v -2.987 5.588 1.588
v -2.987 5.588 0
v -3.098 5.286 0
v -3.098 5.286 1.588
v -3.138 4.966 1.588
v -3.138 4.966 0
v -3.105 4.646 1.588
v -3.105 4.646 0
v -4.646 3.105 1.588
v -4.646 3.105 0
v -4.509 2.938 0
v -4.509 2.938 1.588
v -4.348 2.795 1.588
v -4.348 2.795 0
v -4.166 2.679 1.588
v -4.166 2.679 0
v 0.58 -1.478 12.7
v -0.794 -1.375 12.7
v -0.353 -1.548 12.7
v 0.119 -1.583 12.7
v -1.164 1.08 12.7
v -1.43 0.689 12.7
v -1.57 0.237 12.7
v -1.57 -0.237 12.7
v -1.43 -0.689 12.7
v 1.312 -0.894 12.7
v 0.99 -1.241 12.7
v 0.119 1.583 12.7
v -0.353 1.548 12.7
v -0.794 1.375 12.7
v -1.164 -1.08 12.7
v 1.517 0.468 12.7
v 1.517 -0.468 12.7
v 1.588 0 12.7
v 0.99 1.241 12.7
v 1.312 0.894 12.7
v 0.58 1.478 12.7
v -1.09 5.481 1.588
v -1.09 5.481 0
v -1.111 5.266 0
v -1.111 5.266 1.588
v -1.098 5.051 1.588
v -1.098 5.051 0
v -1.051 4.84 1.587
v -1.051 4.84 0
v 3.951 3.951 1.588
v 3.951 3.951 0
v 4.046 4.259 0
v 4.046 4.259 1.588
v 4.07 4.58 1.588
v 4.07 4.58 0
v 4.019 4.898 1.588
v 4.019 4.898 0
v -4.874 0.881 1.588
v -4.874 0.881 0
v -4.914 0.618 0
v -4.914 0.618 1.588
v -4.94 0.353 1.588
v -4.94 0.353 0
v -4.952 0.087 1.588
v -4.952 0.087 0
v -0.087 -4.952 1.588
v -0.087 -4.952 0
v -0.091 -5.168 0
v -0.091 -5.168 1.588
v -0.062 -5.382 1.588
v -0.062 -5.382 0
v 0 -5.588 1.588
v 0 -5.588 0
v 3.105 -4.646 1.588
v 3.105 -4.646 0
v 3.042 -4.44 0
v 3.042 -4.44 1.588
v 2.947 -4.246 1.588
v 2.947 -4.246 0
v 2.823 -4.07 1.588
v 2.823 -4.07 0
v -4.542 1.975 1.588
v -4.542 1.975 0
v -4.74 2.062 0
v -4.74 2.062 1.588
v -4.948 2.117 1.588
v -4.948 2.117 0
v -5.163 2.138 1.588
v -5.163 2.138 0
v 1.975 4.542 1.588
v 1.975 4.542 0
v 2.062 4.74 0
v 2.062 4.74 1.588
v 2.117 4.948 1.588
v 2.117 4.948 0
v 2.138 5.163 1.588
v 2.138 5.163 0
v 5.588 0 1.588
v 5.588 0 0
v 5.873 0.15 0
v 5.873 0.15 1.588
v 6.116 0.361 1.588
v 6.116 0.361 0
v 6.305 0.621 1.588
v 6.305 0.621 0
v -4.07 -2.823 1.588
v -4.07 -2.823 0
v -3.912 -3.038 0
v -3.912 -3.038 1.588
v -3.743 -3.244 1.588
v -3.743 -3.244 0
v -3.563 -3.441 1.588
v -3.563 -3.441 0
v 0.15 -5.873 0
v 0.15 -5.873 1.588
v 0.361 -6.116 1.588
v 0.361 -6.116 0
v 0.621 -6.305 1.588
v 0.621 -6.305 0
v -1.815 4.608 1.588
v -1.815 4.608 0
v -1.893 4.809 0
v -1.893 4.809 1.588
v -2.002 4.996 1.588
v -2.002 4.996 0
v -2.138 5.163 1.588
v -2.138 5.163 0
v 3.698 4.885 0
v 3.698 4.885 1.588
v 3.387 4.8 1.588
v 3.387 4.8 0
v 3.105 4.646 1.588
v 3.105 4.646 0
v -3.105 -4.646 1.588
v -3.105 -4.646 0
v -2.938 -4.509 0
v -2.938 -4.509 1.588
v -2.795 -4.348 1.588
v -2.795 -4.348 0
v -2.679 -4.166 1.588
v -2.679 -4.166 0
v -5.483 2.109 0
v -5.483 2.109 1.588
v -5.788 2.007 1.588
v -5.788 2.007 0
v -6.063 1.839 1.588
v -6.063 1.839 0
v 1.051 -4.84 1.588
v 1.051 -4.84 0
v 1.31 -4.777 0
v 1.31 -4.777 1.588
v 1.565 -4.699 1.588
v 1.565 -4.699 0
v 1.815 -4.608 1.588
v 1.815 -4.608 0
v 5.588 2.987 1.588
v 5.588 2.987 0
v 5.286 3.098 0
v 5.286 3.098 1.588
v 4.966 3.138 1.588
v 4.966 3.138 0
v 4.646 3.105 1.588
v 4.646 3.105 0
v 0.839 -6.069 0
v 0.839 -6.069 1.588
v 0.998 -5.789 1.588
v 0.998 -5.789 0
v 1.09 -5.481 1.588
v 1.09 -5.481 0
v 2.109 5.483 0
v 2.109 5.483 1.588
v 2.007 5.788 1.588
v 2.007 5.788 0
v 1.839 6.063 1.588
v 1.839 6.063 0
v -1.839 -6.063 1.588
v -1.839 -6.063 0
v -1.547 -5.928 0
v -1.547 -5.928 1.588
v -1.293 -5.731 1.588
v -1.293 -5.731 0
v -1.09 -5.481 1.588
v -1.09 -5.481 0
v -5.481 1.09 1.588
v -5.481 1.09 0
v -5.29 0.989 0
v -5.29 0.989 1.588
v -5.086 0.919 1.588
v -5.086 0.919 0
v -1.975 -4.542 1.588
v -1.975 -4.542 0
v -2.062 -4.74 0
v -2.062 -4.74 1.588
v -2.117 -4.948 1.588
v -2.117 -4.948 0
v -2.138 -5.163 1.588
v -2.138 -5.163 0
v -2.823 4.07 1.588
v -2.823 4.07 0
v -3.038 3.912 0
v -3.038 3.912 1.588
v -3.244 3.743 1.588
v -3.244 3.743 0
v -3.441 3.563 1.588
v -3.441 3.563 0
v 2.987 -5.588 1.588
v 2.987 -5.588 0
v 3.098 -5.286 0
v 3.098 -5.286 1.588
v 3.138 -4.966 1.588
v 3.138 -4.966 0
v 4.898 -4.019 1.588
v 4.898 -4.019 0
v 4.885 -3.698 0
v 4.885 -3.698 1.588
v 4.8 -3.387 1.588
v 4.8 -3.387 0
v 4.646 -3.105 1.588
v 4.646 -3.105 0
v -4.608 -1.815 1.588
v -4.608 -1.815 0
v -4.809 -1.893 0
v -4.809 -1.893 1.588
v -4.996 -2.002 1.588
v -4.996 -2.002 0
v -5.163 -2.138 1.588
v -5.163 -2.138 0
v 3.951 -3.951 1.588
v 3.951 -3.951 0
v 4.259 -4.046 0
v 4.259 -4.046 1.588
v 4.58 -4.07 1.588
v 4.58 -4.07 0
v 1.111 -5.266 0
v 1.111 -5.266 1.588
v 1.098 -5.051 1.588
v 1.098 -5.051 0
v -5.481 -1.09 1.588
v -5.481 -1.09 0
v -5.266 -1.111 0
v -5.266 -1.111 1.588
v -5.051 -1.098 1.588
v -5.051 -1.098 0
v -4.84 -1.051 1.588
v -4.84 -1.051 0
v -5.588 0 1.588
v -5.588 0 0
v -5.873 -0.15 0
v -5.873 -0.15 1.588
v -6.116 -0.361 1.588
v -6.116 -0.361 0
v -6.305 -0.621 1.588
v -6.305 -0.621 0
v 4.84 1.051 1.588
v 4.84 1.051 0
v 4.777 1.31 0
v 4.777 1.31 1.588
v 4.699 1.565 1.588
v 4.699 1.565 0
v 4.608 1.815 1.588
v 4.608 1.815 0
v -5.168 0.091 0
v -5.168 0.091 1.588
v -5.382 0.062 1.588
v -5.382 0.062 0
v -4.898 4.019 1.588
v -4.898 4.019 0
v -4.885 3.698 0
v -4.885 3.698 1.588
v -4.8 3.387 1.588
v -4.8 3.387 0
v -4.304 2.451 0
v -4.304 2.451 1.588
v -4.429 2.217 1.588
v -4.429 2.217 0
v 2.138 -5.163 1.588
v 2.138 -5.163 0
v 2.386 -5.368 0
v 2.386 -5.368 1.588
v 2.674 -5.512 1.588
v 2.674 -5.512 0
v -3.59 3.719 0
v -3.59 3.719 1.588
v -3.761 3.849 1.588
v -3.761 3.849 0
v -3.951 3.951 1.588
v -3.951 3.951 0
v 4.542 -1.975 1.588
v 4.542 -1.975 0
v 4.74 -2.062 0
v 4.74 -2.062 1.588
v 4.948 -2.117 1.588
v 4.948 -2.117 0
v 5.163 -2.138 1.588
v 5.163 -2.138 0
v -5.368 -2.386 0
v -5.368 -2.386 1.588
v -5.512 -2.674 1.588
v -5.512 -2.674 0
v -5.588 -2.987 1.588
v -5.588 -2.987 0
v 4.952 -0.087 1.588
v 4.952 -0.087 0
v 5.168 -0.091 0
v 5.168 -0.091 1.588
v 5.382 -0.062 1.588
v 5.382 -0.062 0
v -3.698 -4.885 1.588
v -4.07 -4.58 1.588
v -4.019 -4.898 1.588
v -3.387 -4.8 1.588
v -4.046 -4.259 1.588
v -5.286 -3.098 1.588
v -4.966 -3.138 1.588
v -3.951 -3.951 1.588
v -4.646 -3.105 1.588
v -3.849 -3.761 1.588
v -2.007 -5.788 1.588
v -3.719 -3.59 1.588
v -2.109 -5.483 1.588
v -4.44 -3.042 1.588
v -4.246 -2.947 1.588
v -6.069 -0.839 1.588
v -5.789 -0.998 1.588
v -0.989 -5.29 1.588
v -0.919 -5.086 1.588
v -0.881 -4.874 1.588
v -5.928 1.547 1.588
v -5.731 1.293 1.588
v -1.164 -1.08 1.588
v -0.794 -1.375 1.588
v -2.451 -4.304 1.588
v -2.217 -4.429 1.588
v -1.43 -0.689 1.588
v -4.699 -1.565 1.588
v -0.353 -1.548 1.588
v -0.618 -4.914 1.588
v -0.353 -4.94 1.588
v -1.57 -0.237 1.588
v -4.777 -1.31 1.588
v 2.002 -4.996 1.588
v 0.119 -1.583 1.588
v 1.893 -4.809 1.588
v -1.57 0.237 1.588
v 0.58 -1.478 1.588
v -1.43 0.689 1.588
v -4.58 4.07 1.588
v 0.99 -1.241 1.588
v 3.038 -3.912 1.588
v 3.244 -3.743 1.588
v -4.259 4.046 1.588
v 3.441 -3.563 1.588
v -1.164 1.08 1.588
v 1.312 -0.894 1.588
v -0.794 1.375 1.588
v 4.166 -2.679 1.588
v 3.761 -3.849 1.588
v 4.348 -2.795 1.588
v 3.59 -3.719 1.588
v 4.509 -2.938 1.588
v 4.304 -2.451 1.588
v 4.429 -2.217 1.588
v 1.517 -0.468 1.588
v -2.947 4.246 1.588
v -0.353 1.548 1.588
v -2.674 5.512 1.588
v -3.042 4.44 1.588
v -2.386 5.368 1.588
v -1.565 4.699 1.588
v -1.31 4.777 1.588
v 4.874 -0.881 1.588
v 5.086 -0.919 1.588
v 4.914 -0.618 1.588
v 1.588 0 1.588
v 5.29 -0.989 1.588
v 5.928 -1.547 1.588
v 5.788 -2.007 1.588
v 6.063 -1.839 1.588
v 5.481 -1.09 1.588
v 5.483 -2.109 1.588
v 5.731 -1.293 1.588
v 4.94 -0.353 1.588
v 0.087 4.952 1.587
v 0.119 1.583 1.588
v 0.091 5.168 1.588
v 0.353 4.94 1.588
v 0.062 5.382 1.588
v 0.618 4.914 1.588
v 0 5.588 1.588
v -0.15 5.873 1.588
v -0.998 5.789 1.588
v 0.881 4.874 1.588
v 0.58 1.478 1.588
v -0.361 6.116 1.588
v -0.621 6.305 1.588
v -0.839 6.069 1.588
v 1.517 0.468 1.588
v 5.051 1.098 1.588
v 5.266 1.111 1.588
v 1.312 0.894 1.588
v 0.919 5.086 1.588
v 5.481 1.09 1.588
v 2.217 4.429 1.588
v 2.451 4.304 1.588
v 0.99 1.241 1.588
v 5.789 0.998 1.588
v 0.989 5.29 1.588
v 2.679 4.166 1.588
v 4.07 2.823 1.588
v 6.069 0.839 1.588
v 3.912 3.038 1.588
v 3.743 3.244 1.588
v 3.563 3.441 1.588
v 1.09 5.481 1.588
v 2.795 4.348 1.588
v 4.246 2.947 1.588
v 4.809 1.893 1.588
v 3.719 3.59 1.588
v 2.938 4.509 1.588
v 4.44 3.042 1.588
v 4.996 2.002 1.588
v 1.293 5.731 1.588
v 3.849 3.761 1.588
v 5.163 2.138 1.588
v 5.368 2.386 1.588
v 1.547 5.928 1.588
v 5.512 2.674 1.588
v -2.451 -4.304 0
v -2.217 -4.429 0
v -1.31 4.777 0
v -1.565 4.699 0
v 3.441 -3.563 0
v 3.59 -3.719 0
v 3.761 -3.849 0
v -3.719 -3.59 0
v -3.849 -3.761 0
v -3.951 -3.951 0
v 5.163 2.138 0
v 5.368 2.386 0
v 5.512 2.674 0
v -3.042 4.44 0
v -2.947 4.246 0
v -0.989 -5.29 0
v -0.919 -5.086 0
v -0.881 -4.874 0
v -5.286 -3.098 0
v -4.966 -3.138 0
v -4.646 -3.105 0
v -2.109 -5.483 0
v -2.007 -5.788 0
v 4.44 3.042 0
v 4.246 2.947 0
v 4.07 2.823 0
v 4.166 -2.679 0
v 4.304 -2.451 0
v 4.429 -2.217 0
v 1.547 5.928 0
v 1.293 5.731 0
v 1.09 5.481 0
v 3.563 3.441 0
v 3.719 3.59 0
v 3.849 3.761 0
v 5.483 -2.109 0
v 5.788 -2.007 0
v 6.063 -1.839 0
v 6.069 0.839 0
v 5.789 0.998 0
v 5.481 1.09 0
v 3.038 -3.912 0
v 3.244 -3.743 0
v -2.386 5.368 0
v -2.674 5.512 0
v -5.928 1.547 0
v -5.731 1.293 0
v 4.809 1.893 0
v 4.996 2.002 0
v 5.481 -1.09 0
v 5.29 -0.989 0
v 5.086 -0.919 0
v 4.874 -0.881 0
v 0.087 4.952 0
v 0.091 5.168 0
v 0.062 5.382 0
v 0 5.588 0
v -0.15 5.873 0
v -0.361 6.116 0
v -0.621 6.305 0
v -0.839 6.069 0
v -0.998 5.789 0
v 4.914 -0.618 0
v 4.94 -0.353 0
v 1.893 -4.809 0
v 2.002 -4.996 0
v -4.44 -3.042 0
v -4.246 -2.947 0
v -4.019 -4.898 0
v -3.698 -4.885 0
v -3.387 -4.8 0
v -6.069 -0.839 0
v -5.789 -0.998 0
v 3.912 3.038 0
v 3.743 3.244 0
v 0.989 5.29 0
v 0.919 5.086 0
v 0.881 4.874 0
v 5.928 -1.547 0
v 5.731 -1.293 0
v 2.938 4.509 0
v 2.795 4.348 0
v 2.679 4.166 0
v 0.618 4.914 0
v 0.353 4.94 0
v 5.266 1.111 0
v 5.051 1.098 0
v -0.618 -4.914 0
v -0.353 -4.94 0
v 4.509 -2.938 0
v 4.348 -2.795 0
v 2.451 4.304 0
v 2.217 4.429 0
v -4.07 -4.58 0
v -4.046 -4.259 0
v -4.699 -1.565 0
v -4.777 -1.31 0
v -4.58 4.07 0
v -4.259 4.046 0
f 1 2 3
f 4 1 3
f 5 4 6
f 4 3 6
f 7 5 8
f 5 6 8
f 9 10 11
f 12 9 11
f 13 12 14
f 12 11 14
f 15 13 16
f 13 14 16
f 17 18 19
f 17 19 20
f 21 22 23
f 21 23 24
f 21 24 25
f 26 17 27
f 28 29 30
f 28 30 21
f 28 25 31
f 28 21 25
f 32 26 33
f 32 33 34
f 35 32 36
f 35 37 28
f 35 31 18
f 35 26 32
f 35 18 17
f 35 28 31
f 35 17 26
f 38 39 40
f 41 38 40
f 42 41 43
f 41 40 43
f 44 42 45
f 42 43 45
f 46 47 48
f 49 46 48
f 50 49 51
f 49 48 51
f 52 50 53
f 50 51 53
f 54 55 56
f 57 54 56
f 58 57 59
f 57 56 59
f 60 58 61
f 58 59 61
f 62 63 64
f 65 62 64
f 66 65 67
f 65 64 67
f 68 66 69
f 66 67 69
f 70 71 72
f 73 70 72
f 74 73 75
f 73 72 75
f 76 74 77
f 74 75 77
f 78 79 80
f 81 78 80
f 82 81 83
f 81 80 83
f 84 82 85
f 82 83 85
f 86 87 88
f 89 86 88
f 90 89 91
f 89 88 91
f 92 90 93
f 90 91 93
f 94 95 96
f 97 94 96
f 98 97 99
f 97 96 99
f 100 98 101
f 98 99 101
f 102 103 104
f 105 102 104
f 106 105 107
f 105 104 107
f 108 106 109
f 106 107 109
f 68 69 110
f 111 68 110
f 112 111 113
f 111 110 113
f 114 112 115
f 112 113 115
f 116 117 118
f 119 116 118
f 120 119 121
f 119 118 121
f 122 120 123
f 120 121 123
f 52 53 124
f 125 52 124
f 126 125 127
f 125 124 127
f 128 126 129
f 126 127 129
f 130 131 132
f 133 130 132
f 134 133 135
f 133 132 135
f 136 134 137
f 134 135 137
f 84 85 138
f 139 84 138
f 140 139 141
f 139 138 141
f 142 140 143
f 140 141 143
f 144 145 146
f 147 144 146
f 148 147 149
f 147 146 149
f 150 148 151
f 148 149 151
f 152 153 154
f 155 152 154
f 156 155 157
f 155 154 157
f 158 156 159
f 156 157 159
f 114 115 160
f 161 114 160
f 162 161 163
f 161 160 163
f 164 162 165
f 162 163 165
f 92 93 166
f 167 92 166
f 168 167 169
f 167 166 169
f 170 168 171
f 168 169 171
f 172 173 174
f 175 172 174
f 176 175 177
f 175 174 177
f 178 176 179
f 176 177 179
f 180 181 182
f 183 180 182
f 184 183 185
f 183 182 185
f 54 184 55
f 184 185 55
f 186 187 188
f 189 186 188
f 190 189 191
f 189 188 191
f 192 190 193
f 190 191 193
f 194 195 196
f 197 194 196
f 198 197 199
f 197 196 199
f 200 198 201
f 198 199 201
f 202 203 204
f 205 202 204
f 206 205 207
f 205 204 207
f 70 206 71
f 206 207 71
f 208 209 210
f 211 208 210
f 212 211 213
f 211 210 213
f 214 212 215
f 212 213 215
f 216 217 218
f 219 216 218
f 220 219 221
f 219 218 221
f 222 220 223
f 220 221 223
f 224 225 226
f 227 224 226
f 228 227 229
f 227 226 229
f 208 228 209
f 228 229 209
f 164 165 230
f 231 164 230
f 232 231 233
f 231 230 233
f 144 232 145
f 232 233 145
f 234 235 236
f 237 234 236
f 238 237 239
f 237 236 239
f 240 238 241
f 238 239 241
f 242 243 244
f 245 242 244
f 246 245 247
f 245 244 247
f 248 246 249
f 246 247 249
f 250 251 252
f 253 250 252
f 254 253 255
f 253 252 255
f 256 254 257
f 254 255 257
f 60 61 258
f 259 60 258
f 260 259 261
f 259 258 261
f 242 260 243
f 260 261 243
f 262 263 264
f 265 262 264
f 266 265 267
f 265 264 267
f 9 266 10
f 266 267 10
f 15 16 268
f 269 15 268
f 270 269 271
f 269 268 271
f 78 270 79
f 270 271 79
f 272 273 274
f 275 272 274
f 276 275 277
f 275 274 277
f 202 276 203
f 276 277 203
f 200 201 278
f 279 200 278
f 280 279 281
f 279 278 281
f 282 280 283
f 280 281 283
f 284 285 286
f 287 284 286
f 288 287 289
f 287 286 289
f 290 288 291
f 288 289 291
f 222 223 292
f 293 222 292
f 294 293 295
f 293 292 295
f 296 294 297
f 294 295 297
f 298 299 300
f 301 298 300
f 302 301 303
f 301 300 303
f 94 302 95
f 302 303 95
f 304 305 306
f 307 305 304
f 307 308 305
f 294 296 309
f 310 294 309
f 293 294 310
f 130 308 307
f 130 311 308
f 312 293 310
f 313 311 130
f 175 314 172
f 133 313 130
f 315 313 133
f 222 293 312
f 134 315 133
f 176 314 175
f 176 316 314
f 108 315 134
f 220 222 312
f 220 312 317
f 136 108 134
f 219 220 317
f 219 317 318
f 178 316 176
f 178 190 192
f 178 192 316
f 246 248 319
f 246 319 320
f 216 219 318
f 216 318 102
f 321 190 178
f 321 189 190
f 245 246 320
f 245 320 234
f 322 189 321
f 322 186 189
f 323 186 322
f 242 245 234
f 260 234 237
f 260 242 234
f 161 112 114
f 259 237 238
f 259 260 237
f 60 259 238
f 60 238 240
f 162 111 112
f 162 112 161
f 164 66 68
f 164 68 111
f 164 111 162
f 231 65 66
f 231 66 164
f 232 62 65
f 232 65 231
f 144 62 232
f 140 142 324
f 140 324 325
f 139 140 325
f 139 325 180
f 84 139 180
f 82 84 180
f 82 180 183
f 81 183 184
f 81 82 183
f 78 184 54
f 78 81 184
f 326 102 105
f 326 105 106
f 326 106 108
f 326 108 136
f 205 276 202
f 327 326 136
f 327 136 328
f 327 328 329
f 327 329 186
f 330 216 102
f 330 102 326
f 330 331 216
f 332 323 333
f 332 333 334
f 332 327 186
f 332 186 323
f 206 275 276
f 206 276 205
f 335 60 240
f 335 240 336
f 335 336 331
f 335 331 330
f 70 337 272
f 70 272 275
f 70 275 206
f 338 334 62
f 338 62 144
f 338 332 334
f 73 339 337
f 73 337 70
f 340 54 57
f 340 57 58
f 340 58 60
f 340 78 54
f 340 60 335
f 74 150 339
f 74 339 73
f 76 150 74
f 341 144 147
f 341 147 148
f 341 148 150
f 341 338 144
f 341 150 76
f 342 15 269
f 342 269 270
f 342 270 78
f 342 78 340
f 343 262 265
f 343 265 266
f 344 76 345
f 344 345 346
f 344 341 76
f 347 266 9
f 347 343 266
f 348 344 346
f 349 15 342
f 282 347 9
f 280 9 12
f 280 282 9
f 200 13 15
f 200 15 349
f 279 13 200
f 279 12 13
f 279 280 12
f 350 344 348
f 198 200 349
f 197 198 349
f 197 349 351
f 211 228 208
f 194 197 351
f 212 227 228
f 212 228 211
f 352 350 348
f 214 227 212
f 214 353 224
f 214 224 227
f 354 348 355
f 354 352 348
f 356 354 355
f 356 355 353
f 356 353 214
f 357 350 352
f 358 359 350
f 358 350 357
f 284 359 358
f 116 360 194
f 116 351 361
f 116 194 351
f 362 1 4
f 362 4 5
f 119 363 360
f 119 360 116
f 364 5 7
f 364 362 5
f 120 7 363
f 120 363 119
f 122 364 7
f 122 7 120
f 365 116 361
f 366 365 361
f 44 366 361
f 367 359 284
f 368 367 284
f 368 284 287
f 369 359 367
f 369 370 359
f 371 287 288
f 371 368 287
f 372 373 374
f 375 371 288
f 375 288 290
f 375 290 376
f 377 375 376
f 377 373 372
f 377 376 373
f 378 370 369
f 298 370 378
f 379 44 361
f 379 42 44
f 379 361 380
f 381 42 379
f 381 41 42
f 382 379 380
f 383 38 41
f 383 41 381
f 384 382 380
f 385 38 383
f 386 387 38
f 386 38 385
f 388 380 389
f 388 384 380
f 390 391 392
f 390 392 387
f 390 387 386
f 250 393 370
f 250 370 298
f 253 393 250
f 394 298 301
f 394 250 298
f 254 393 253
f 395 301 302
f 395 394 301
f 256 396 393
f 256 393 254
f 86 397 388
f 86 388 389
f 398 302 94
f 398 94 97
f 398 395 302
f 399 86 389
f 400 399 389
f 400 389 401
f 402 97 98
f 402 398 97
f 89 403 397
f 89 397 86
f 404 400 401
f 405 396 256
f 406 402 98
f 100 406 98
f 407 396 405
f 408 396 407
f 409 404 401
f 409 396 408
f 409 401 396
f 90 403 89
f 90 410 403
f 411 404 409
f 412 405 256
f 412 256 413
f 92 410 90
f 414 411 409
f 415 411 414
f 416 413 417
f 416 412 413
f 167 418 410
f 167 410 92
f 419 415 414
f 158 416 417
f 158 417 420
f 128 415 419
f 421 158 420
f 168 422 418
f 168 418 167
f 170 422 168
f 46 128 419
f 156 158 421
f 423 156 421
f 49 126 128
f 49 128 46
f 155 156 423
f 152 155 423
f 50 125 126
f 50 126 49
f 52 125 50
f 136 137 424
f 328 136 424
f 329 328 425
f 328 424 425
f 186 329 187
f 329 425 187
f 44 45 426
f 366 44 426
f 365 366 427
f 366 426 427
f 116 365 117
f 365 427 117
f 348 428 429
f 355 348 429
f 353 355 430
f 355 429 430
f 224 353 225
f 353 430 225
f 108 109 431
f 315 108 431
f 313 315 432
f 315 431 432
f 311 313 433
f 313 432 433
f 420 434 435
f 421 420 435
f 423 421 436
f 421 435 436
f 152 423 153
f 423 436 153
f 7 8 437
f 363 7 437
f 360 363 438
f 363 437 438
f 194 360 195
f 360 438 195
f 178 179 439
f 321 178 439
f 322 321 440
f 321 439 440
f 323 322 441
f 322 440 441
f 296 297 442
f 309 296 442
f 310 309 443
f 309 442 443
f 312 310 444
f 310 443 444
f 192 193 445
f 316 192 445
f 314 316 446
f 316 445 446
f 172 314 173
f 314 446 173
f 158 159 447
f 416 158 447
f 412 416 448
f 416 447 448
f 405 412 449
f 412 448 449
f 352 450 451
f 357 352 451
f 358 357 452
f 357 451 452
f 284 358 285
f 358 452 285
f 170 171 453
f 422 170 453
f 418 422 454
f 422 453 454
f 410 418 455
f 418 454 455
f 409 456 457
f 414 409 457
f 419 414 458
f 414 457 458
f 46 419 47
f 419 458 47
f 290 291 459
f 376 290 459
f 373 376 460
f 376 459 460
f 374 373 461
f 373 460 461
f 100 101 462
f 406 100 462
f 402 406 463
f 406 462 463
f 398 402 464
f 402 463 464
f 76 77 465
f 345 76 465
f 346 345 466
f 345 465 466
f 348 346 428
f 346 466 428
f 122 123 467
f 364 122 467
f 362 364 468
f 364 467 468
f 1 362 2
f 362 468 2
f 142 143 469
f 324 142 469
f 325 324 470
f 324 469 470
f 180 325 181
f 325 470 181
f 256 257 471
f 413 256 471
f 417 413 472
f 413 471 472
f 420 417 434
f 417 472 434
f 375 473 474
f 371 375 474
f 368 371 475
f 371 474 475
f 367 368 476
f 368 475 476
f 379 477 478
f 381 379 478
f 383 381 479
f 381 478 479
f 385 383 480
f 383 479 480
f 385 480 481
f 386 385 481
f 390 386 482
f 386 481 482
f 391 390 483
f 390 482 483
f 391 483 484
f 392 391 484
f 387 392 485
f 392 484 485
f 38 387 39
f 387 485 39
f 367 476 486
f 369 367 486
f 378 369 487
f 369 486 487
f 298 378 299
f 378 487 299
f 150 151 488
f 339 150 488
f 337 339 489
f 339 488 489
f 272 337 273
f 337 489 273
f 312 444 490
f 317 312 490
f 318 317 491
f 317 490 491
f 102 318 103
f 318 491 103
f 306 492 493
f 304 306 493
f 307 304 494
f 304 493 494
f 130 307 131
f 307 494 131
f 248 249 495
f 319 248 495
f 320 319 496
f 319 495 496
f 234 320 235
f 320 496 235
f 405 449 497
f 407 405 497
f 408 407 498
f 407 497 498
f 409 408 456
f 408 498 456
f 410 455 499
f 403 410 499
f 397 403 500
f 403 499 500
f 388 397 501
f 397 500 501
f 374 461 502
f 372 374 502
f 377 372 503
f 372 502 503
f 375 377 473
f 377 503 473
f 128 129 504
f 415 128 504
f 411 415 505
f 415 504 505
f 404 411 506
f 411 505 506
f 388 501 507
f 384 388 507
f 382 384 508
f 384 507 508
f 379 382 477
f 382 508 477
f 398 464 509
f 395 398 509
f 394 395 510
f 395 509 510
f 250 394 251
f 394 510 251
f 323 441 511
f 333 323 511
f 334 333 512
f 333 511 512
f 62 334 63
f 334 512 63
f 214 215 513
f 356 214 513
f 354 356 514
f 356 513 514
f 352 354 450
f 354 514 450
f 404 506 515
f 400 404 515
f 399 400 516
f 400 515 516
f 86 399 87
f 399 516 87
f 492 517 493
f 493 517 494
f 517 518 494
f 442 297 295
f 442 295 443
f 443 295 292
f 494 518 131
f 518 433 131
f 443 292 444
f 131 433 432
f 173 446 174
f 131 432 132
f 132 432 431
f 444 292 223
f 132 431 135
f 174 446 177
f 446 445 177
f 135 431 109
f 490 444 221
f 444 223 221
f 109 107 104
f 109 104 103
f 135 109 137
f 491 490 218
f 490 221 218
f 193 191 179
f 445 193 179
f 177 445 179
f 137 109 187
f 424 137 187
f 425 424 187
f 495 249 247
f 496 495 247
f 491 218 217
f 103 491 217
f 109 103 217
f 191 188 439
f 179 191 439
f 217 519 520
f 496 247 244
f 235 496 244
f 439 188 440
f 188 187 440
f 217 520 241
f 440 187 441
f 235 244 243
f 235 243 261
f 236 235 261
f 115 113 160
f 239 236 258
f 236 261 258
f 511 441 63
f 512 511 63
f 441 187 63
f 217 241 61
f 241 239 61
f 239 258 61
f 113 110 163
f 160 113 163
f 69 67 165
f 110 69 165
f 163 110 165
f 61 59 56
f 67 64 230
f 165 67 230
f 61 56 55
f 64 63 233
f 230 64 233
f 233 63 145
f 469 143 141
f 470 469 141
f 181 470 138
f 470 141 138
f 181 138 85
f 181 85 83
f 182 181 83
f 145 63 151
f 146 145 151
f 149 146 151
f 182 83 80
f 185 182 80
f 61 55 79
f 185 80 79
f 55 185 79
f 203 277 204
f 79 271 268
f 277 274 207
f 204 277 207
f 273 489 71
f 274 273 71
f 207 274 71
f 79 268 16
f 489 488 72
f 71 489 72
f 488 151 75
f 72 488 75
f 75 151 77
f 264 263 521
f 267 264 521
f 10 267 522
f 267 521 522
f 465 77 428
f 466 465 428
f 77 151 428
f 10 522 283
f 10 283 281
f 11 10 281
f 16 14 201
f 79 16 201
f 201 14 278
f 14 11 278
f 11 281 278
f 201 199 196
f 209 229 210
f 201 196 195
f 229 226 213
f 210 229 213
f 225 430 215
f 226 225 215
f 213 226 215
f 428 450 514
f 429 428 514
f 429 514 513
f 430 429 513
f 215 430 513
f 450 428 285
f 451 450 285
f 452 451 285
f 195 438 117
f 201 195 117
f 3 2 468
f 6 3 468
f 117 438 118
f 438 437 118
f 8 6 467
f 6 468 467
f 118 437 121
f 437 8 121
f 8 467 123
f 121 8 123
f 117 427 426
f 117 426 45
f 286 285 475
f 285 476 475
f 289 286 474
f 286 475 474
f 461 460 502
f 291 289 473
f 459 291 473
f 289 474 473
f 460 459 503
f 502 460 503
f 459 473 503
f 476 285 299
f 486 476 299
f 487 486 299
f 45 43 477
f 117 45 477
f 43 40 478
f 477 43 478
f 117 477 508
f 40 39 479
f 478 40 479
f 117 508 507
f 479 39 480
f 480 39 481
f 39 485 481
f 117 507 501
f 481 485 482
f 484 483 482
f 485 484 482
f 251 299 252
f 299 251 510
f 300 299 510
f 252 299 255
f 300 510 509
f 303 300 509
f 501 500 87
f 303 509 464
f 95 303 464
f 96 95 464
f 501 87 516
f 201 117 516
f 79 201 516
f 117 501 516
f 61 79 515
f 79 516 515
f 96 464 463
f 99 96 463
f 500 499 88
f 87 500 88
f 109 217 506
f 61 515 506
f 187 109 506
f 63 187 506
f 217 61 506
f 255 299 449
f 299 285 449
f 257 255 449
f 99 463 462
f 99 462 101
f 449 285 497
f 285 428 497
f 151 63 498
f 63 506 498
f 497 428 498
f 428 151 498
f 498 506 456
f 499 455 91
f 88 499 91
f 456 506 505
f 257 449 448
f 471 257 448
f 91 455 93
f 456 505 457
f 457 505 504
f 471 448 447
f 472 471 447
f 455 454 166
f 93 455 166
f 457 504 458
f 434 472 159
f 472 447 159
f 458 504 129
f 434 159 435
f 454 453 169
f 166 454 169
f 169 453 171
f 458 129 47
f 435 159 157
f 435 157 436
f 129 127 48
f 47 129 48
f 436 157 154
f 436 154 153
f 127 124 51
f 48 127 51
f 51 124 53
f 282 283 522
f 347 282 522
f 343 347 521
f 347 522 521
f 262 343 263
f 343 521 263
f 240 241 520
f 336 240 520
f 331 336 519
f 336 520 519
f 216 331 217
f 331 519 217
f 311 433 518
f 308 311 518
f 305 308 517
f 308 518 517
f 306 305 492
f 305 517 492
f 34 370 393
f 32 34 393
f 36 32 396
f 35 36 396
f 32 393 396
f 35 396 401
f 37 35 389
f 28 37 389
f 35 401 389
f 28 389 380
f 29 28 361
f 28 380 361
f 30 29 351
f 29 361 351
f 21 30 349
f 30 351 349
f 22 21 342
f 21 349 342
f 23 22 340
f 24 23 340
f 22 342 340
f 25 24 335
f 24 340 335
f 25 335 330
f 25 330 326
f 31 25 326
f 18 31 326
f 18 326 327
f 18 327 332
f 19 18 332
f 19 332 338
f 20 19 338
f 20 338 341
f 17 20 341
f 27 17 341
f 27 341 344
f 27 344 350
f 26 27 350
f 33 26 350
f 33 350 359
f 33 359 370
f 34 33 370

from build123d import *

# Parameters (mm, degrees)
F1_DEPTH = 1.5875
F2_COUNT = 16
F0_R     = 1.5875
F3_DEPTH = 1.5875
F4_DEPTH = 12.7


with BuildPart() as f1:
    # F0 (on Top) → F1 (new body)
    with BuildSketch(Plane.XY):
        with BuildLine():
            ThreePointArc((-1.0511033425, 4.8401849927), (-0.4854788961, 4.9291499512), (0.0866334376, 4.9522422848))
            ThreePointArc((0.0866334376, 4.9522422848), (0.0809330254, 5.2752470416), (0, 5.588))
            ThreePointArc((0, 5.588), (-0.2484578592, 6.0002980681), (-0.6210025483, 6.3051446843))
            ThreePointArc((-0.6210025483, 6.3051446843), (-0.9269162712, 5.933475747), (-1.0901647194, 5.4806281469))
            ThreePointArc((-1.0901647194, 5.4806281469), (-1.1085275641, 5.1580953989), (-1.0511033425, 4.8401849927))
        make_face()
    extrude(amount=F1_DEPTH)


with BuildPart() as f2_1:
    # F2: instance of F1
    add(f1.part.rotate(Axis((0, 0, 0), (0, 0, 1)), 1 * 360 / F2_COUNT))


with BuildPart() as f2_2:
    # F2: instance of F1
    add(f1.part.rotate(Axis((0, 0, 0), (0, 0, 1)), 2 * 360 / F2_COUNT))


with BuildPart() as f2_3:
    # F2: instance of F1
    add(f1.part.rotate(Axis((0, 0, 0), (0, 0, 1)), 3 * 360 / F2_COUNT))


with BuildPart() as f2_4:
    # F2: instance of F1
    add(f1.part.rotate(Axis((0, 0, 0), (0, 0, 1)), 4 * 360 / F2_COUNT))


with BuildPart() as f2_5:
    # F2: instance of F1
    add(f1.part.rotate(Axis((0, 0, 0), (0, 0, 1)), 5 * 360 / F2_COUNT))


with BuildPart() as f2_6:
    # F2: instance of F1
    add(f1.part.rotate(Axis((0, 0, 0), (0, 0, 1)), 6 * 360 / F2_COUNT))


with BuildPart() as f2_7:
    # F2: instance of F1
    add(f1.part.rotate(Axis((0, 0, 0), (0, 0, 1)), 7 * 360 / F2_COUNT))


with BuildPart() as f2_8:
    # F2: instance of F1
    add(f1.part.rotate(Axis((0, 0, 0), (0, 0, 1)), 8 * 360 / F2_COUNT))


with BuildPart() as f2_9:
    # F2: instance of F1
    add(f1.part.rotate(Axis((0, 0, 0), (0, 0, 1)), 9 * 360 / F2_COUNT))


with BuildPart() as f2_10:
    # F2: instance of F1
    add(f1.part.rotate(Axis((0, 0, 0), (0, 0, 1)), 10 * 360 / F2_COUNT))


with BuildPart() as f2_11:
    # F2: instance of F1
    add(f1.part.rotate(Axis((0, 0, 0), (0, 0, 1)), 11 * 360 / F2_COUNT))


with BuildPart() as f2_12:
    # F2: instance of F1
    add(f1.part.rotate(Axis((0, 0, 0), (0, 0, 1)), 12 * 360 / F2_COUNT))


with BuildPart() as f2_13:
    # F2: instance of F1
    add(f1.part.rotate(Axis((0, 0, 0), (0, 0, 1)), 13 * 360 / F2_COUNT))


with BuildPart() as f2_14:
    # F2: instance of F1
    add(f1.part.rotate(Axis((0, 0, 0), (0, 0, 1)), 14 * 360 / F2_COUNT))


with BuildPart() as f2_15:
    # F2: instance of F1
    add(f1.part.rotate(Axis((0, 0, 0), (0, 0, 1)), 15 * 360 / F2_COUNT))


with BuildPart() as f1_1:
    add(f1.part)

    add(f2_1.part)  # F3 merges F2_1

    add(f2_2.part)  # F3 merges F2_2

    add(f2_3.part)  # F3 merges F2_3

    add(f2_4.part)  # F3 merges F2_4

    add(f2_5.part)  # F3 merges F2_5

    add(f2_6.part)  # F3 merges F2_6

    add(f2_7.part)  # F3 merges F2_7

    add(f2_8.part)  # F3 merges F2_8

    add(f2_9.part)  # F3 merges F2_9

    add(f2_10.part)  # F3 merges F2_10

    add(f2_11.part)  # F3 merges F2_11

    add(f2_12.part)  # F3 merges F2_12

    add(f2_13.part)  # F3 merges F2_13

    add(f2_14.part)  # F3 merges F2_14

    add(f2_15.part)  # F3 merges F2_15
    # F0 (on Top) → F3 (join)
    with BuildSketch(Plane.XY):
        with BuildLine():
            ThreePointArc((-1.0511033425, 4.8401849927), (-3.1085442047, -3.8560552288), (4.953, 0))
            ThreePointArc((4.953, 0), (3.5327966554, 3.4715352211), (0.0866334376, 4.9522422848))
            ThreePointArc((0.0866334376, 4.9522422848), (-0.4854788961, 4.9291499512), (-1.0511033425, 4.8401849927))
        make_face()
        Circle(F0_R, mode=Mode.SUBTRACT)
    extrude(amount=F3_DEPTH)

    # F0 (on Top) → F4 (join)
    with BuildSketch(Plane.XY):
        Circle(F0_R)
    extrude(amount=F4_DEPTH)


solid = f1_1.part
